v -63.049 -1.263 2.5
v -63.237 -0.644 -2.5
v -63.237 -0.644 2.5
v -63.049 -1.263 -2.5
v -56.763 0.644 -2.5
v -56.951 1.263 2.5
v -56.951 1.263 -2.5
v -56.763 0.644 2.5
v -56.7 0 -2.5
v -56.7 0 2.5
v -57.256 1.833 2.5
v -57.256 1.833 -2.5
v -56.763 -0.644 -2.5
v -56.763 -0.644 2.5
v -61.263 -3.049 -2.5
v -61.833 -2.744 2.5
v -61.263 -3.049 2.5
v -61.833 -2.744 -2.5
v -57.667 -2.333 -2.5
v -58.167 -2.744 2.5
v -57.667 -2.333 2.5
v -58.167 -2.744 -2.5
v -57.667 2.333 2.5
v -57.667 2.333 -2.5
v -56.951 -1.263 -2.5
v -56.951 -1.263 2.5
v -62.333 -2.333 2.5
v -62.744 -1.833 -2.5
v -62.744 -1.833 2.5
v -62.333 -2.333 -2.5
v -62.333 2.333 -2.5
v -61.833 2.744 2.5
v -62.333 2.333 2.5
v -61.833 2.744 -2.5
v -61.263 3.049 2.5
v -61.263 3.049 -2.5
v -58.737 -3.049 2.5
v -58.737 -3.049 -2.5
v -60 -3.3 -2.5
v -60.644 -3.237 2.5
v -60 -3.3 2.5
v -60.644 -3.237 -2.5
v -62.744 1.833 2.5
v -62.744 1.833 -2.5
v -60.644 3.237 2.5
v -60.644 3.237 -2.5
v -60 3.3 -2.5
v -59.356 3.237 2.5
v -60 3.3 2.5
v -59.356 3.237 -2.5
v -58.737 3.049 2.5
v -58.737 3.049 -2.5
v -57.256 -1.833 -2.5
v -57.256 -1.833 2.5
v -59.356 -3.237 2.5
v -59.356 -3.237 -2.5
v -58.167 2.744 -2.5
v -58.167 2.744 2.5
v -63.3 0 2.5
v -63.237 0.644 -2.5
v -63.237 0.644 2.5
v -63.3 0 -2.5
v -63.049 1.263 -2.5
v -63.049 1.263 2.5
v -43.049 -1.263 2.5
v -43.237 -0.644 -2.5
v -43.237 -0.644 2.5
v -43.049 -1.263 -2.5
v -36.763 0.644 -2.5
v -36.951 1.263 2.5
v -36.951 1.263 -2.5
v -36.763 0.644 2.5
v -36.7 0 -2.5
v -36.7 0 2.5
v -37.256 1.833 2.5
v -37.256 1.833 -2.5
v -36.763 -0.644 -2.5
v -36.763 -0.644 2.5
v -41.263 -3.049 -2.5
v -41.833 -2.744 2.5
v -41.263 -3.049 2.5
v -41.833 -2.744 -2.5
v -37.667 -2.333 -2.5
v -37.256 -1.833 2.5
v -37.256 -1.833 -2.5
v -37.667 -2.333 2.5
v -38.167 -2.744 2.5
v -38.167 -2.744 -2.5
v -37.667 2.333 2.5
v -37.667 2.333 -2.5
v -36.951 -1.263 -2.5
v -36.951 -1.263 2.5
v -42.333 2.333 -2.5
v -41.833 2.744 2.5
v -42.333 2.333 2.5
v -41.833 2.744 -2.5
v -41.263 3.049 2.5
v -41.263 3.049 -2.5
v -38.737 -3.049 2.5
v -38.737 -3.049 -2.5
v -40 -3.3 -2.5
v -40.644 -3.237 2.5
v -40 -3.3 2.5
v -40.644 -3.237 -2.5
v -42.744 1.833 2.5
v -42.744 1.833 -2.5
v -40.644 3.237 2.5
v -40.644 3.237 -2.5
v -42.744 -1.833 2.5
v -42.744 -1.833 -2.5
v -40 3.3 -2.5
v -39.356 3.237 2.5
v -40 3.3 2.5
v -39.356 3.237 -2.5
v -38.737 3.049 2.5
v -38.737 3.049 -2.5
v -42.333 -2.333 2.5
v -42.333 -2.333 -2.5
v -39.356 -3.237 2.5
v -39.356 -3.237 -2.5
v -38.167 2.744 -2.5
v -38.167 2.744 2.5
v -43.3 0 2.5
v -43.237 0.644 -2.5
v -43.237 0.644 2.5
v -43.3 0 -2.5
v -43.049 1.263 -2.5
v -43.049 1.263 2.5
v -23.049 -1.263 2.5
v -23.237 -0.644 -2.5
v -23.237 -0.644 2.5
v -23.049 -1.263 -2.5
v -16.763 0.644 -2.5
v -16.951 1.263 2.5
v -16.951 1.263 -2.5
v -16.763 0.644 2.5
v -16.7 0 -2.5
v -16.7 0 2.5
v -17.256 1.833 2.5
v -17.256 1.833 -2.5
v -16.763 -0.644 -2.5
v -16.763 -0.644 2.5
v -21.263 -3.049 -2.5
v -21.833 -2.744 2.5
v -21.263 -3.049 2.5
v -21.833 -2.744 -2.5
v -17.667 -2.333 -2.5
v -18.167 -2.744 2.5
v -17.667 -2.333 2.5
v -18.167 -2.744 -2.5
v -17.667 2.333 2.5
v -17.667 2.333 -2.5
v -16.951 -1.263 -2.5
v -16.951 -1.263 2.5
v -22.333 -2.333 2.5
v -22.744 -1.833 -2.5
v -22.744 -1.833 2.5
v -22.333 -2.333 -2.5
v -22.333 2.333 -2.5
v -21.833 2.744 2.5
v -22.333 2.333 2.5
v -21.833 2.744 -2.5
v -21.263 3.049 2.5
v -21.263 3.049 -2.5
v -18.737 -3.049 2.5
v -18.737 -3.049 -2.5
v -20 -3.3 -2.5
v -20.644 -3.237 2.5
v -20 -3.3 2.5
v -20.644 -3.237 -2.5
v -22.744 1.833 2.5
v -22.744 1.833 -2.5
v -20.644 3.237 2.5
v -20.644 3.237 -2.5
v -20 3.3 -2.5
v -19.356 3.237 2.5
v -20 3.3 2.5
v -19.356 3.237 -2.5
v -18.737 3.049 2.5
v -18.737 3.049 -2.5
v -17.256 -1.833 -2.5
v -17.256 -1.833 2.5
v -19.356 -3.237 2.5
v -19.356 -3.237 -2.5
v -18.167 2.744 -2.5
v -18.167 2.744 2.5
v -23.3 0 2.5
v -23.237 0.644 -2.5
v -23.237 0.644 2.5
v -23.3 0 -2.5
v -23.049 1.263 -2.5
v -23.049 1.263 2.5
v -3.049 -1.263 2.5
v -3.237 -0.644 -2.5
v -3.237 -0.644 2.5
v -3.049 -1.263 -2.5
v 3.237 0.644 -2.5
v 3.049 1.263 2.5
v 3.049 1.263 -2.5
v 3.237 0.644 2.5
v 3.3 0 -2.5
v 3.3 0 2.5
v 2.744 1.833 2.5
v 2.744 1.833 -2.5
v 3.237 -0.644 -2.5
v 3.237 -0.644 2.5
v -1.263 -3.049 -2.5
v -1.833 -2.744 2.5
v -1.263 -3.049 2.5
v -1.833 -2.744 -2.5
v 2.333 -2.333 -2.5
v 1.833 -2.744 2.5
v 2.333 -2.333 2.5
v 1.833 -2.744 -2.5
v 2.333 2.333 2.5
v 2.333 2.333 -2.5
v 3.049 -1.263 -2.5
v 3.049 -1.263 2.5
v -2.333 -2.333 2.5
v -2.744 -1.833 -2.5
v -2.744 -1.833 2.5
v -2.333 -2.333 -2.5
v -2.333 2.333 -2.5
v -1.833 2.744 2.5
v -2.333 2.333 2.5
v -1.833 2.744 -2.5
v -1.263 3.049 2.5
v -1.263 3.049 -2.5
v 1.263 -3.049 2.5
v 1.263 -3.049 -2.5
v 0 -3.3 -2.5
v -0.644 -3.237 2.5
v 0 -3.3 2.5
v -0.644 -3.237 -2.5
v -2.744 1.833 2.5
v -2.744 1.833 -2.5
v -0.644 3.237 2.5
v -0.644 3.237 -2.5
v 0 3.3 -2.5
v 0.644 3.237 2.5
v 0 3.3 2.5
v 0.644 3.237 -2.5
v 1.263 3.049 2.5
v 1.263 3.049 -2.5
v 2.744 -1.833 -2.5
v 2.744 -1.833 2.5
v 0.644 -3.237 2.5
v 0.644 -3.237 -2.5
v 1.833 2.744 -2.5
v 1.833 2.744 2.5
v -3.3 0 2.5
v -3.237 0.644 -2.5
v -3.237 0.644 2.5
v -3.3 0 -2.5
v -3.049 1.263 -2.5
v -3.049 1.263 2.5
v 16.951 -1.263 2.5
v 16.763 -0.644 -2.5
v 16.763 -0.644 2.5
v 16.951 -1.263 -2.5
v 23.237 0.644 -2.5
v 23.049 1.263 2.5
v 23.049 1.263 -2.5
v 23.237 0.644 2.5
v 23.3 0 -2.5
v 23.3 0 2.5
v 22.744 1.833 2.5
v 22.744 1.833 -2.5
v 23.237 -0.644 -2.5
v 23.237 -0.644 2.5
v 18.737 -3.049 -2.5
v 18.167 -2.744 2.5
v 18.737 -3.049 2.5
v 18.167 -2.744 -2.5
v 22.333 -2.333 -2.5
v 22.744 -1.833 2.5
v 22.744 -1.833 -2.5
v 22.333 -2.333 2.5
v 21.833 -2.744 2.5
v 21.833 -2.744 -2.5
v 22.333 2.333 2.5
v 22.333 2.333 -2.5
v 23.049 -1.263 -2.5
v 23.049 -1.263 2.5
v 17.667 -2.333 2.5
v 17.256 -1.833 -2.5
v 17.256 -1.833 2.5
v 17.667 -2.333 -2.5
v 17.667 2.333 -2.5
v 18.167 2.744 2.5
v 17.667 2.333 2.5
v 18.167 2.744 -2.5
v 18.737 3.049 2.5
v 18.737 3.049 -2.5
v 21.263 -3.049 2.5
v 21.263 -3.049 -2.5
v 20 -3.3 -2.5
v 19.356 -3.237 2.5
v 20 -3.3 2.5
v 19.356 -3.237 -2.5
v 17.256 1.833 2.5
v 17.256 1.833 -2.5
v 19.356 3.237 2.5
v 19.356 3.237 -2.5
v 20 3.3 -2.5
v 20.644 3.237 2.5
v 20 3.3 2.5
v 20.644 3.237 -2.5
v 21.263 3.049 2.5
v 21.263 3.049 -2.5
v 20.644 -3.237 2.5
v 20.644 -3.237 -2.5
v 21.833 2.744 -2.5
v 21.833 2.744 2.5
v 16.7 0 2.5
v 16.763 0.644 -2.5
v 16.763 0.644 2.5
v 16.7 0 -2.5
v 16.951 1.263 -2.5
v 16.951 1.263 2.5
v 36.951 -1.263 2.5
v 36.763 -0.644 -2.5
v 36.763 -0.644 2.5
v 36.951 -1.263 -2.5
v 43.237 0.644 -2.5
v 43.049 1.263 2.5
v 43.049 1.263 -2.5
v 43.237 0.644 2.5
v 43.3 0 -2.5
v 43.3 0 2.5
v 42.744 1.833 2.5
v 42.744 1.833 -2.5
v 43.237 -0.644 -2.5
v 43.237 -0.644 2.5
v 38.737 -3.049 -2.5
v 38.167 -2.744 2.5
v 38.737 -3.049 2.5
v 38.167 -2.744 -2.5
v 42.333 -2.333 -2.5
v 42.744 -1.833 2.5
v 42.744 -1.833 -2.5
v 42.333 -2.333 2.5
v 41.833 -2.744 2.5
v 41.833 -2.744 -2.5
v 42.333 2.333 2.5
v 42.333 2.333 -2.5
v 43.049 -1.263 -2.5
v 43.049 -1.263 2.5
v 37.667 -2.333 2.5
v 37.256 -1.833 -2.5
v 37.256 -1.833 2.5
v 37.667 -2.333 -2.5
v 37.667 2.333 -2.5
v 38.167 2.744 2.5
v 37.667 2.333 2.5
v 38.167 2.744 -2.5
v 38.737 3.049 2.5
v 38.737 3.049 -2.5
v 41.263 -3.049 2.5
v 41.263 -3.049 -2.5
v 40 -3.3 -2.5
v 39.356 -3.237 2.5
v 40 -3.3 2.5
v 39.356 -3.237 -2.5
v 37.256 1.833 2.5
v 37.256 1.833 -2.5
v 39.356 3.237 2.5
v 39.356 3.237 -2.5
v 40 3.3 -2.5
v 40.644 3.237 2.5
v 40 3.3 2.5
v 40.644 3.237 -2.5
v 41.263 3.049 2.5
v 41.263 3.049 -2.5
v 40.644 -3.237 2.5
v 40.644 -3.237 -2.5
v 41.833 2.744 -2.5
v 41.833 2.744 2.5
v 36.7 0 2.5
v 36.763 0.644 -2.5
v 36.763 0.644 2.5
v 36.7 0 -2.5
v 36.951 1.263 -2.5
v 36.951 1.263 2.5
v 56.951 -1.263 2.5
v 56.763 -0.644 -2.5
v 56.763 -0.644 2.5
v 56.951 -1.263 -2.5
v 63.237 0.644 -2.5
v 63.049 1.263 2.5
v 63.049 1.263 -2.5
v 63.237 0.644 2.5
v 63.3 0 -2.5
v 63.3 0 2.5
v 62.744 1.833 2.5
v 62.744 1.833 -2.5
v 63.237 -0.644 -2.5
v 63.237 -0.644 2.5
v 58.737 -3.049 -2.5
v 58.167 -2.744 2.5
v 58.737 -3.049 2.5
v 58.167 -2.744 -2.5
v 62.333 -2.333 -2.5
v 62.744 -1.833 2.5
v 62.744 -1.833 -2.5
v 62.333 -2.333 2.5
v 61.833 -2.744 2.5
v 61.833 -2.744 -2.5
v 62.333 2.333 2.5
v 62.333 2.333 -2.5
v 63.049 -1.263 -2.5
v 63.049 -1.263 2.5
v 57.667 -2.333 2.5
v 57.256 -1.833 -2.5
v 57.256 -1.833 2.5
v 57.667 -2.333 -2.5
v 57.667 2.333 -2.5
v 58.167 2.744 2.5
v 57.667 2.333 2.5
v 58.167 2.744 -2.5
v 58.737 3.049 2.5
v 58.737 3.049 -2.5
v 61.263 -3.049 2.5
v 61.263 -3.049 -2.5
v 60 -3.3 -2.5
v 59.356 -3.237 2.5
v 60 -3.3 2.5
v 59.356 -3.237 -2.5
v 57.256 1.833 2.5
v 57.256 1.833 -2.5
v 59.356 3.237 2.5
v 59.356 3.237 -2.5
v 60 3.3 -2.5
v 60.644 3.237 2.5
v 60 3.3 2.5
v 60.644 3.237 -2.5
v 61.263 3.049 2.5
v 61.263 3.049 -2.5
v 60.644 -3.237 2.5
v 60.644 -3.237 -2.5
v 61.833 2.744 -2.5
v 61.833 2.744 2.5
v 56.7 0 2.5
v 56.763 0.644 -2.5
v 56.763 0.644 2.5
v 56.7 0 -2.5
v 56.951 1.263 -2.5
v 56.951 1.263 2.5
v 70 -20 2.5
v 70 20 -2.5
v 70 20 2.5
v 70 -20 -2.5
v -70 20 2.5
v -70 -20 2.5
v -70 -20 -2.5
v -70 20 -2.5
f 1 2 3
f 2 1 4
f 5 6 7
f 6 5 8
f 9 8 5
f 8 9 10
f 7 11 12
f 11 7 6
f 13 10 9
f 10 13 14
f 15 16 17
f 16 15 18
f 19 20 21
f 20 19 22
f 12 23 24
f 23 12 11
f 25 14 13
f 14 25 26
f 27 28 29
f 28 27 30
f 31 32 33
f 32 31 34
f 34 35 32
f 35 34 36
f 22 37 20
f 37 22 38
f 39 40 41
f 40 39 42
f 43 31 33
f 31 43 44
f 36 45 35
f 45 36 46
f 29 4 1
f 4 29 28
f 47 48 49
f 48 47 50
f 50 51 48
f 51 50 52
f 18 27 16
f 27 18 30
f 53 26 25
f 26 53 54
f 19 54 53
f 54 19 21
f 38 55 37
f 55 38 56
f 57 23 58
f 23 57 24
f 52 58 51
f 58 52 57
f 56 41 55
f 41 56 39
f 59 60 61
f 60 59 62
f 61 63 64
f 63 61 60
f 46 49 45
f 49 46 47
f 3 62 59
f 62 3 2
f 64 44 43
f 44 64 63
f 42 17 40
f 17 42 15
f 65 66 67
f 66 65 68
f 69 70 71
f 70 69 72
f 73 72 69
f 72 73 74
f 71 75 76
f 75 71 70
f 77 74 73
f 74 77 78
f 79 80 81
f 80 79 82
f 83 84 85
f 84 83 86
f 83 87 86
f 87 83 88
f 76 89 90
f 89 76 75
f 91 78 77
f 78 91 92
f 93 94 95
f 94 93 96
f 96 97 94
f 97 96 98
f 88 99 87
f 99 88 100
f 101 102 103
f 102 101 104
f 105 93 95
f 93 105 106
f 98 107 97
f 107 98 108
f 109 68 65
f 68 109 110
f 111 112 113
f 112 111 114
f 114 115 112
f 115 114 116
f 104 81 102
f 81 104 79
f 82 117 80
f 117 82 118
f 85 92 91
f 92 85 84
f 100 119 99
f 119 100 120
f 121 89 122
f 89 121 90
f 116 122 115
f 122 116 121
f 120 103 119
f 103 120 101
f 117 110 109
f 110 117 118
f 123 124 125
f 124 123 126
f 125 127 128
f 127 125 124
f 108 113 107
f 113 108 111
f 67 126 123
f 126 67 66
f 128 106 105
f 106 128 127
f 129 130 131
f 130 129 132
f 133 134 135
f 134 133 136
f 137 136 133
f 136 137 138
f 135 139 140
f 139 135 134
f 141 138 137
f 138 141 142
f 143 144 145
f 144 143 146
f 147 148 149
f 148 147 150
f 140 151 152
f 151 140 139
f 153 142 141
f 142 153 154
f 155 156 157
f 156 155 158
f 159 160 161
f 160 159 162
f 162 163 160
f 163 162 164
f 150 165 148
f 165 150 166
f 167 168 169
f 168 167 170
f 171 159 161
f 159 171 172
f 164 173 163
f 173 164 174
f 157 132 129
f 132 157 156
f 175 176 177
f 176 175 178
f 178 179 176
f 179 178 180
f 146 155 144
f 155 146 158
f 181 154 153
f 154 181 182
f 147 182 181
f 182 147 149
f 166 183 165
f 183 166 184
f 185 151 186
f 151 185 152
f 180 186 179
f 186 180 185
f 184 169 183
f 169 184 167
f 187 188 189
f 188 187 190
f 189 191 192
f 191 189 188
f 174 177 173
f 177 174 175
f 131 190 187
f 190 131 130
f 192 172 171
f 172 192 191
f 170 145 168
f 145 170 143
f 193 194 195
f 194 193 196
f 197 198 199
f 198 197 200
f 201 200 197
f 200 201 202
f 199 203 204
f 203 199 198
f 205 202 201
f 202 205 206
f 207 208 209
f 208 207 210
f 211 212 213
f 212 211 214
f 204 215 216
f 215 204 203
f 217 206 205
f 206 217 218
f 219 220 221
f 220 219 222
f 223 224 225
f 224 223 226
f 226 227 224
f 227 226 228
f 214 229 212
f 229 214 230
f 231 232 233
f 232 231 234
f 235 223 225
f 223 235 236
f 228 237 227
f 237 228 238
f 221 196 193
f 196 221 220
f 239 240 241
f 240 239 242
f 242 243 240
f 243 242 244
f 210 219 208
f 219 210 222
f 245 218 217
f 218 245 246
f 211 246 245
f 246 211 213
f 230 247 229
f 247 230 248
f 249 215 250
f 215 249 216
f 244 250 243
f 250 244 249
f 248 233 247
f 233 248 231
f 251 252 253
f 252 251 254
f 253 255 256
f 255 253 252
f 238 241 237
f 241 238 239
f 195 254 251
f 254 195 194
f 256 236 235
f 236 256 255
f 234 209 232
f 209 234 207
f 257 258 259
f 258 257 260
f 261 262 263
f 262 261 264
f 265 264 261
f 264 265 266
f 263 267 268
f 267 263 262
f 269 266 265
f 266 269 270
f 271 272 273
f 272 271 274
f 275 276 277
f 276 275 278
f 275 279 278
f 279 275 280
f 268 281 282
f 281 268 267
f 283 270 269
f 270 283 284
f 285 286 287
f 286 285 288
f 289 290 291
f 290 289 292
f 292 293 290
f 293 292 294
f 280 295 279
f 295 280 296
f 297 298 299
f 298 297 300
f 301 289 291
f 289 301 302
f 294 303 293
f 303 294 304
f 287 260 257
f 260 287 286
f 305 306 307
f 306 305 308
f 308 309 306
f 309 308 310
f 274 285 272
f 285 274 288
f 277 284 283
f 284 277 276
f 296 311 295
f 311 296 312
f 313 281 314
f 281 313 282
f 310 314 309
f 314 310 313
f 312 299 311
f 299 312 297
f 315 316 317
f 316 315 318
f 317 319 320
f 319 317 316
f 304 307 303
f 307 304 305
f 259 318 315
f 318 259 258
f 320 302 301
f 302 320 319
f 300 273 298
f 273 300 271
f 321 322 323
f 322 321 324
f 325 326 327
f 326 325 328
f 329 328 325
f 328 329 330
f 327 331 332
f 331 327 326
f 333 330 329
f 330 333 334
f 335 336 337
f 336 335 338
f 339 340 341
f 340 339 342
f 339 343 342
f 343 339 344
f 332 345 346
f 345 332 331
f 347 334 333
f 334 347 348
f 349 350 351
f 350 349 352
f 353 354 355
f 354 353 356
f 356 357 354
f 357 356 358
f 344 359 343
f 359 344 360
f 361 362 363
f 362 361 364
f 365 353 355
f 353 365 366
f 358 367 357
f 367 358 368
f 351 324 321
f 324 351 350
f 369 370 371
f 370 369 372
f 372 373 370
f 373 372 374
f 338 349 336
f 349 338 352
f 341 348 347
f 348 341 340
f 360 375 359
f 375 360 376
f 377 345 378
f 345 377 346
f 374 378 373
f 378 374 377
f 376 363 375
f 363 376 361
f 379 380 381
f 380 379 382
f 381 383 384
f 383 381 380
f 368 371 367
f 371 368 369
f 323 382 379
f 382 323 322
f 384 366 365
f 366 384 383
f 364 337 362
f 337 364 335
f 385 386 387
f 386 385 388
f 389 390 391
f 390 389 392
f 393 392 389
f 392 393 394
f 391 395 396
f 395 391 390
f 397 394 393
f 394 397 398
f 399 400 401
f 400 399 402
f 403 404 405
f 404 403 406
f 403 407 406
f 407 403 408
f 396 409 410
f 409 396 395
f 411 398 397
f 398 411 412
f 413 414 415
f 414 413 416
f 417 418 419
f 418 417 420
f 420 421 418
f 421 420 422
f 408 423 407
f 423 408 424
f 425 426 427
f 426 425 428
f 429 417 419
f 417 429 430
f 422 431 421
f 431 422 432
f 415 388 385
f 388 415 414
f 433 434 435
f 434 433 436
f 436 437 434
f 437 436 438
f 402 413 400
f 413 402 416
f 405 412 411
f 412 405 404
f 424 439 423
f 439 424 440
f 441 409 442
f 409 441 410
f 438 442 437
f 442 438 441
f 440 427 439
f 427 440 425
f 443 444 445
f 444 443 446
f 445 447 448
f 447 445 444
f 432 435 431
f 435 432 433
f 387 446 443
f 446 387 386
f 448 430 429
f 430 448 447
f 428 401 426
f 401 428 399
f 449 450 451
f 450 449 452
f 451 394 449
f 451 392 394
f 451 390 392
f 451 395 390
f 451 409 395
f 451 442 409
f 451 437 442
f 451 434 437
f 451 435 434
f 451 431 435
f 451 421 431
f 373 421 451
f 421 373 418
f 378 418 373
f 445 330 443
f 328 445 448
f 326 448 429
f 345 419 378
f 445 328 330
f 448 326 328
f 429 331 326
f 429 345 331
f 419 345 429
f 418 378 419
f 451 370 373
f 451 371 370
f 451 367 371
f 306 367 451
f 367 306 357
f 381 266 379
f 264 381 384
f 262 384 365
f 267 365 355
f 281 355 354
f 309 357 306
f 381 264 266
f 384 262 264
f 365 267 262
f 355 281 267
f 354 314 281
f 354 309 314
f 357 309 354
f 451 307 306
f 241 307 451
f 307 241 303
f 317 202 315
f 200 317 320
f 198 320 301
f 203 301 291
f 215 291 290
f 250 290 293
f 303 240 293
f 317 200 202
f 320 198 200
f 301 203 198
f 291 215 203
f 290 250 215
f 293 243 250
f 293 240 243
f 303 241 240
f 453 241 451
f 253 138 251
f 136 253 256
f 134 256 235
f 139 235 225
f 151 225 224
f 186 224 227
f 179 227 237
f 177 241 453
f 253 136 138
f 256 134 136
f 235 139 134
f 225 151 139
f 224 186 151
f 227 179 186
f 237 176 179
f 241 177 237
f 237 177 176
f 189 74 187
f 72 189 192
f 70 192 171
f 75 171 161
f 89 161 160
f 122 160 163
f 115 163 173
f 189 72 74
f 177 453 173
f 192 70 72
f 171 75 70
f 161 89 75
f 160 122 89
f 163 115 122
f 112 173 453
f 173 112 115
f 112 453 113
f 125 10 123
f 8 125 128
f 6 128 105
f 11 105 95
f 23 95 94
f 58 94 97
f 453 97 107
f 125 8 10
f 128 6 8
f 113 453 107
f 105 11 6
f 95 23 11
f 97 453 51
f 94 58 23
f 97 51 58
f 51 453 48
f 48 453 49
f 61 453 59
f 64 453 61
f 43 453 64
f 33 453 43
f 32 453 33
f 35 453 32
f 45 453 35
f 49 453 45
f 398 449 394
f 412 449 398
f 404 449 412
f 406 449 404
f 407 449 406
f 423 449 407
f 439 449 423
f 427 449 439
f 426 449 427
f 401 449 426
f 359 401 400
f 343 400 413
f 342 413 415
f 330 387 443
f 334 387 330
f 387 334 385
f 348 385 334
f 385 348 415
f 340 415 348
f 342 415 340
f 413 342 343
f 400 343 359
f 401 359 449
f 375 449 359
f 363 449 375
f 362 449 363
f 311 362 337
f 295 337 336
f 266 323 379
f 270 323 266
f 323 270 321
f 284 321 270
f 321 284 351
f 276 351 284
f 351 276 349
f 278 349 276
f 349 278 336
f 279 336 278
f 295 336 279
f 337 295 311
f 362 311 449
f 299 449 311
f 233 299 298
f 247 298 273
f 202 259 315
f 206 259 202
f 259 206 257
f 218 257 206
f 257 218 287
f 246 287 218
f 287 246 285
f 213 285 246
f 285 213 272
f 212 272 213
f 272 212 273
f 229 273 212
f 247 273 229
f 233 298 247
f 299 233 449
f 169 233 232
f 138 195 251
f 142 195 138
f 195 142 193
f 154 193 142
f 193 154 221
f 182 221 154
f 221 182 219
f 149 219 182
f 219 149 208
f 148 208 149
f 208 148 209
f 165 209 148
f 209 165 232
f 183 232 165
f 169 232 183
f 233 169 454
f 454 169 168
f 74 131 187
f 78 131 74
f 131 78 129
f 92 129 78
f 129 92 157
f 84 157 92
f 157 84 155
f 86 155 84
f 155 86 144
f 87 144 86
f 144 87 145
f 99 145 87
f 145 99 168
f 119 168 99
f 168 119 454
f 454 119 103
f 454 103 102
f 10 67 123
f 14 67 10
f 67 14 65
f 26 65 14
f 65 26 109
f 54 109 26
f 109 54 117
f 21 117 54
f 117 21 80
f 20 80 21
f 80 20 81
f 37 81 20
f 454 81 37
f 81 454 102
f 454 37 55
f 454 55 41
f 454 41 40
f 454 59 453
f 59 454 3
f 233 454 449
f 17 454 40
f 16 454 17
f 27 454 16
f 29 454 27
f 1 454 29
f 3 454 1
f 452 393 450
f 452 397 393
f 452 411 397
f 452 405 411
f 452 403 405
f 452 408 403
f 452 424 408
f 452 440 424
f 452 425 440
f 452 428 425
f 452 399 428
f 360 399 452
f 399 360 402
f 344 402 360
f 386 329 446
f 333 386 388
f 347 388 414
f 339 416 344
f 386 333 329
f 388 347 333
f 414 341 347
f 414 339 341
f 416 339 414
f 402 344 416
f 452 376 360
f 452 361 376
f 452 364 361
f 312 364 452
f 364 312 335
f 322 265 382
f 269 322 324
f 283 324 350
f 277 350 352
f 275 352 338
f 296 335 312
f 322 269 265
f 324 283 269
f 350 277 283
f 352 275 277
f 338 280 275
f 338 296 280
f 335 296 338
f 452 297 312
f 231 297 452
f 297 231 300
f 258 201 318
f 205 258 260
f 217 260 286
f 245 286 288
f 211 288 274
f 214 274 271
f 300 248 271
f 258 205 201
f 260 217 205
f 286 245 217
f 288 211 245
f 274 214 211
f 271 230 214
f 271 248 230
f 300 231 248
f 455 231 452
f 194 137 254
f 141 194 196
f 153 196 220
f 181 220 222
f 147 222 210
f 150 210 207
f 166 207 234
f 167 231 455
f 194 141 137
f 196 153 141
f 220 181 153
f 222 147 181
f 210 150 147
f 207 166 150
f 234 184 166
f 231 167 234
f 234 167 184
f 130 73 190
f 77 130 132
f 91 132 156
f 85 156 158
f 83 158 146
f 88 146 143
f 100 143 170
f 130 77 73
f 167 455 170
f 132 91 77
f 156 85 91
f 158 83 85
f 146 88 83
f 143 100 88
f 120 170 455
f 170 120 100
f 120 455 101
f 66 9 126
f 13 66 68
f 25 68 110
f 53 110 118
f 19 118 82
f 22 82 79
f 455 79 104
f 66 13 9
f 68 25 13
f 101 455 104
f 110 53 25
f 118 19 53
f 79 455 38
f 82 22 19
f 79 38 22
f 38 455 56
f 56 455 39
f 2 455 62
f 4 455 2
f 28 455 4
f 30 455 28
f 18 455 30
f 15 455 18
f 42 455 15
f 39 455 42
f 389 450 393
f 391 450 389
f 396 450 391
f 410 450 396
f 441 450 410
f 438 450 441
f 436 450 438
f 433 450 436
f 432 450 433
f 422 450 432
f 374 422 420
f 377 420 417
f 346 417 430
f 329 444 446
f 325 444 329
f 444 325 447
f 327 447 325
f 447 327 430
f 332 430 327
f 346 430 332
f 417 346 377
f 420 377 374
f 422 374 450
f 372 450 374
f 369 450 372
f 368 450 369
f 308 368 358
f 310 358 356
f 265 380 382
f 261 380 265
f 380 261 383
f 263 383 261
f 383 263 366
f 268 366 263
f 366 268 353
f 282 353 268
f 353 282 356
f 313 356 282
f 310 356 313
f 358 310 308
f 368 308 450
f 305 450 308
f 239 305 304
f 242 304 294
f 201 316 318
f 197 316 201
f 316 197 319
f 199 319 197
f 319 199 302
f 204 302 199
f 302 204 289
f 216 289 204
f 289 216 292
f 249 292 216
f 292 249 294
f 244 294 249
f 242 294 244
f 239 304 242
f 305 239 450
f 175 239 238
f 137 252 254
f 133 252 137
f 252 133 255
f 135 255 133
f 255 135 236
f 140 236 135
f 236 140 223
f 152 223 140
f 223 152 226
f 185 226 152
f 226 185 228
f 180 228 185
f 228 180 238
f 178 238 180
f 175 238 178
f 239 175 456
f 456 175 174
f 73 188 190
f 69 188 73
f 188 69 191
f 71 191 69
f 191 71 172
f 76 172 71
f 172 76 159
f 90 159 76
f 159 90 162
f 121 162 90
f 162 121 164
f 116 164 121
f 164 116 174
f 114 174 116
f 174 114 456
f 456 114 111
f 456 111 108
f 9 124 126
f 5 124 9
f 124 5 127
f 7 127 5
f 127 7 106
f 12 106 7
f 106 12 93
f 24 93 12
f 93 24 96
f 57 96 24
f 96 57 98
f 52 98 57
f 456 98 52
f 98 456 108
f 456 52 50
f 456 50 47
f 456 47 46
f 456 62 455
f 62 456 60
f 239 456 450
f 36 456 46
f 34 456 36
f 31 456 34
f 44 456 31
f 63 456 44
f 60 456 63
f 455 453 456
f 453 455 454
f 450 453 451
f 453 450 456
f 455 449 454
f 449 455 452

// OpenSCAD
$fn = 32;

// ----------------------------------------------------------------------
// Hole bar, 7 x Ø6.6
// row layout, 10 mm edge offset
// ----------------------------------------------------------------------

// --- parameters (mm) ---
bar_w = 40;    // bar width (Y)
bar_t = 5;     // bar thickness (Z)
holes = 7;     // holes per row
hole_d = 6.6;  // hole diameter
edge = 10;     // offset from the bar end to the first hole
pitch = 20;    // pitch between neighbouring holes

// --- derived feature positions (mm) ---
span = (holes - 1) * pitch;   // = 120   distance between the end holes
bar_l = span + 2 * edge;      // = 140   overall bar length
start_x = -bar_l / 2 + edge;  // = -60   X of the first hole
feature_centers = [
  [start_x + 0 * pitch, 0],
  [start_x + 1 * pitch, 0],
  [start_x + 2 * pitch, 0],
  [start_x + 3 * pitch, 0],
  [start_x + 4 * pitch, 0],
  [start_x + 5 * pitch, 0],
  [start_x + 6 * pitch, 0]
];   // hole centres of the first row

// bar with one row of holes, drilled from feature_centers
difference() {
  translate([-bar_l / 2, -bar_w / 2, -bar_t / 2]) cube([bar_l, bar_w, bar_t]);
  for (centre = feature_centers)
    translate([centre[0], centre[1], 0])
      cylinder(d = hole_d, h = bar_t + 2, center = true);
}
